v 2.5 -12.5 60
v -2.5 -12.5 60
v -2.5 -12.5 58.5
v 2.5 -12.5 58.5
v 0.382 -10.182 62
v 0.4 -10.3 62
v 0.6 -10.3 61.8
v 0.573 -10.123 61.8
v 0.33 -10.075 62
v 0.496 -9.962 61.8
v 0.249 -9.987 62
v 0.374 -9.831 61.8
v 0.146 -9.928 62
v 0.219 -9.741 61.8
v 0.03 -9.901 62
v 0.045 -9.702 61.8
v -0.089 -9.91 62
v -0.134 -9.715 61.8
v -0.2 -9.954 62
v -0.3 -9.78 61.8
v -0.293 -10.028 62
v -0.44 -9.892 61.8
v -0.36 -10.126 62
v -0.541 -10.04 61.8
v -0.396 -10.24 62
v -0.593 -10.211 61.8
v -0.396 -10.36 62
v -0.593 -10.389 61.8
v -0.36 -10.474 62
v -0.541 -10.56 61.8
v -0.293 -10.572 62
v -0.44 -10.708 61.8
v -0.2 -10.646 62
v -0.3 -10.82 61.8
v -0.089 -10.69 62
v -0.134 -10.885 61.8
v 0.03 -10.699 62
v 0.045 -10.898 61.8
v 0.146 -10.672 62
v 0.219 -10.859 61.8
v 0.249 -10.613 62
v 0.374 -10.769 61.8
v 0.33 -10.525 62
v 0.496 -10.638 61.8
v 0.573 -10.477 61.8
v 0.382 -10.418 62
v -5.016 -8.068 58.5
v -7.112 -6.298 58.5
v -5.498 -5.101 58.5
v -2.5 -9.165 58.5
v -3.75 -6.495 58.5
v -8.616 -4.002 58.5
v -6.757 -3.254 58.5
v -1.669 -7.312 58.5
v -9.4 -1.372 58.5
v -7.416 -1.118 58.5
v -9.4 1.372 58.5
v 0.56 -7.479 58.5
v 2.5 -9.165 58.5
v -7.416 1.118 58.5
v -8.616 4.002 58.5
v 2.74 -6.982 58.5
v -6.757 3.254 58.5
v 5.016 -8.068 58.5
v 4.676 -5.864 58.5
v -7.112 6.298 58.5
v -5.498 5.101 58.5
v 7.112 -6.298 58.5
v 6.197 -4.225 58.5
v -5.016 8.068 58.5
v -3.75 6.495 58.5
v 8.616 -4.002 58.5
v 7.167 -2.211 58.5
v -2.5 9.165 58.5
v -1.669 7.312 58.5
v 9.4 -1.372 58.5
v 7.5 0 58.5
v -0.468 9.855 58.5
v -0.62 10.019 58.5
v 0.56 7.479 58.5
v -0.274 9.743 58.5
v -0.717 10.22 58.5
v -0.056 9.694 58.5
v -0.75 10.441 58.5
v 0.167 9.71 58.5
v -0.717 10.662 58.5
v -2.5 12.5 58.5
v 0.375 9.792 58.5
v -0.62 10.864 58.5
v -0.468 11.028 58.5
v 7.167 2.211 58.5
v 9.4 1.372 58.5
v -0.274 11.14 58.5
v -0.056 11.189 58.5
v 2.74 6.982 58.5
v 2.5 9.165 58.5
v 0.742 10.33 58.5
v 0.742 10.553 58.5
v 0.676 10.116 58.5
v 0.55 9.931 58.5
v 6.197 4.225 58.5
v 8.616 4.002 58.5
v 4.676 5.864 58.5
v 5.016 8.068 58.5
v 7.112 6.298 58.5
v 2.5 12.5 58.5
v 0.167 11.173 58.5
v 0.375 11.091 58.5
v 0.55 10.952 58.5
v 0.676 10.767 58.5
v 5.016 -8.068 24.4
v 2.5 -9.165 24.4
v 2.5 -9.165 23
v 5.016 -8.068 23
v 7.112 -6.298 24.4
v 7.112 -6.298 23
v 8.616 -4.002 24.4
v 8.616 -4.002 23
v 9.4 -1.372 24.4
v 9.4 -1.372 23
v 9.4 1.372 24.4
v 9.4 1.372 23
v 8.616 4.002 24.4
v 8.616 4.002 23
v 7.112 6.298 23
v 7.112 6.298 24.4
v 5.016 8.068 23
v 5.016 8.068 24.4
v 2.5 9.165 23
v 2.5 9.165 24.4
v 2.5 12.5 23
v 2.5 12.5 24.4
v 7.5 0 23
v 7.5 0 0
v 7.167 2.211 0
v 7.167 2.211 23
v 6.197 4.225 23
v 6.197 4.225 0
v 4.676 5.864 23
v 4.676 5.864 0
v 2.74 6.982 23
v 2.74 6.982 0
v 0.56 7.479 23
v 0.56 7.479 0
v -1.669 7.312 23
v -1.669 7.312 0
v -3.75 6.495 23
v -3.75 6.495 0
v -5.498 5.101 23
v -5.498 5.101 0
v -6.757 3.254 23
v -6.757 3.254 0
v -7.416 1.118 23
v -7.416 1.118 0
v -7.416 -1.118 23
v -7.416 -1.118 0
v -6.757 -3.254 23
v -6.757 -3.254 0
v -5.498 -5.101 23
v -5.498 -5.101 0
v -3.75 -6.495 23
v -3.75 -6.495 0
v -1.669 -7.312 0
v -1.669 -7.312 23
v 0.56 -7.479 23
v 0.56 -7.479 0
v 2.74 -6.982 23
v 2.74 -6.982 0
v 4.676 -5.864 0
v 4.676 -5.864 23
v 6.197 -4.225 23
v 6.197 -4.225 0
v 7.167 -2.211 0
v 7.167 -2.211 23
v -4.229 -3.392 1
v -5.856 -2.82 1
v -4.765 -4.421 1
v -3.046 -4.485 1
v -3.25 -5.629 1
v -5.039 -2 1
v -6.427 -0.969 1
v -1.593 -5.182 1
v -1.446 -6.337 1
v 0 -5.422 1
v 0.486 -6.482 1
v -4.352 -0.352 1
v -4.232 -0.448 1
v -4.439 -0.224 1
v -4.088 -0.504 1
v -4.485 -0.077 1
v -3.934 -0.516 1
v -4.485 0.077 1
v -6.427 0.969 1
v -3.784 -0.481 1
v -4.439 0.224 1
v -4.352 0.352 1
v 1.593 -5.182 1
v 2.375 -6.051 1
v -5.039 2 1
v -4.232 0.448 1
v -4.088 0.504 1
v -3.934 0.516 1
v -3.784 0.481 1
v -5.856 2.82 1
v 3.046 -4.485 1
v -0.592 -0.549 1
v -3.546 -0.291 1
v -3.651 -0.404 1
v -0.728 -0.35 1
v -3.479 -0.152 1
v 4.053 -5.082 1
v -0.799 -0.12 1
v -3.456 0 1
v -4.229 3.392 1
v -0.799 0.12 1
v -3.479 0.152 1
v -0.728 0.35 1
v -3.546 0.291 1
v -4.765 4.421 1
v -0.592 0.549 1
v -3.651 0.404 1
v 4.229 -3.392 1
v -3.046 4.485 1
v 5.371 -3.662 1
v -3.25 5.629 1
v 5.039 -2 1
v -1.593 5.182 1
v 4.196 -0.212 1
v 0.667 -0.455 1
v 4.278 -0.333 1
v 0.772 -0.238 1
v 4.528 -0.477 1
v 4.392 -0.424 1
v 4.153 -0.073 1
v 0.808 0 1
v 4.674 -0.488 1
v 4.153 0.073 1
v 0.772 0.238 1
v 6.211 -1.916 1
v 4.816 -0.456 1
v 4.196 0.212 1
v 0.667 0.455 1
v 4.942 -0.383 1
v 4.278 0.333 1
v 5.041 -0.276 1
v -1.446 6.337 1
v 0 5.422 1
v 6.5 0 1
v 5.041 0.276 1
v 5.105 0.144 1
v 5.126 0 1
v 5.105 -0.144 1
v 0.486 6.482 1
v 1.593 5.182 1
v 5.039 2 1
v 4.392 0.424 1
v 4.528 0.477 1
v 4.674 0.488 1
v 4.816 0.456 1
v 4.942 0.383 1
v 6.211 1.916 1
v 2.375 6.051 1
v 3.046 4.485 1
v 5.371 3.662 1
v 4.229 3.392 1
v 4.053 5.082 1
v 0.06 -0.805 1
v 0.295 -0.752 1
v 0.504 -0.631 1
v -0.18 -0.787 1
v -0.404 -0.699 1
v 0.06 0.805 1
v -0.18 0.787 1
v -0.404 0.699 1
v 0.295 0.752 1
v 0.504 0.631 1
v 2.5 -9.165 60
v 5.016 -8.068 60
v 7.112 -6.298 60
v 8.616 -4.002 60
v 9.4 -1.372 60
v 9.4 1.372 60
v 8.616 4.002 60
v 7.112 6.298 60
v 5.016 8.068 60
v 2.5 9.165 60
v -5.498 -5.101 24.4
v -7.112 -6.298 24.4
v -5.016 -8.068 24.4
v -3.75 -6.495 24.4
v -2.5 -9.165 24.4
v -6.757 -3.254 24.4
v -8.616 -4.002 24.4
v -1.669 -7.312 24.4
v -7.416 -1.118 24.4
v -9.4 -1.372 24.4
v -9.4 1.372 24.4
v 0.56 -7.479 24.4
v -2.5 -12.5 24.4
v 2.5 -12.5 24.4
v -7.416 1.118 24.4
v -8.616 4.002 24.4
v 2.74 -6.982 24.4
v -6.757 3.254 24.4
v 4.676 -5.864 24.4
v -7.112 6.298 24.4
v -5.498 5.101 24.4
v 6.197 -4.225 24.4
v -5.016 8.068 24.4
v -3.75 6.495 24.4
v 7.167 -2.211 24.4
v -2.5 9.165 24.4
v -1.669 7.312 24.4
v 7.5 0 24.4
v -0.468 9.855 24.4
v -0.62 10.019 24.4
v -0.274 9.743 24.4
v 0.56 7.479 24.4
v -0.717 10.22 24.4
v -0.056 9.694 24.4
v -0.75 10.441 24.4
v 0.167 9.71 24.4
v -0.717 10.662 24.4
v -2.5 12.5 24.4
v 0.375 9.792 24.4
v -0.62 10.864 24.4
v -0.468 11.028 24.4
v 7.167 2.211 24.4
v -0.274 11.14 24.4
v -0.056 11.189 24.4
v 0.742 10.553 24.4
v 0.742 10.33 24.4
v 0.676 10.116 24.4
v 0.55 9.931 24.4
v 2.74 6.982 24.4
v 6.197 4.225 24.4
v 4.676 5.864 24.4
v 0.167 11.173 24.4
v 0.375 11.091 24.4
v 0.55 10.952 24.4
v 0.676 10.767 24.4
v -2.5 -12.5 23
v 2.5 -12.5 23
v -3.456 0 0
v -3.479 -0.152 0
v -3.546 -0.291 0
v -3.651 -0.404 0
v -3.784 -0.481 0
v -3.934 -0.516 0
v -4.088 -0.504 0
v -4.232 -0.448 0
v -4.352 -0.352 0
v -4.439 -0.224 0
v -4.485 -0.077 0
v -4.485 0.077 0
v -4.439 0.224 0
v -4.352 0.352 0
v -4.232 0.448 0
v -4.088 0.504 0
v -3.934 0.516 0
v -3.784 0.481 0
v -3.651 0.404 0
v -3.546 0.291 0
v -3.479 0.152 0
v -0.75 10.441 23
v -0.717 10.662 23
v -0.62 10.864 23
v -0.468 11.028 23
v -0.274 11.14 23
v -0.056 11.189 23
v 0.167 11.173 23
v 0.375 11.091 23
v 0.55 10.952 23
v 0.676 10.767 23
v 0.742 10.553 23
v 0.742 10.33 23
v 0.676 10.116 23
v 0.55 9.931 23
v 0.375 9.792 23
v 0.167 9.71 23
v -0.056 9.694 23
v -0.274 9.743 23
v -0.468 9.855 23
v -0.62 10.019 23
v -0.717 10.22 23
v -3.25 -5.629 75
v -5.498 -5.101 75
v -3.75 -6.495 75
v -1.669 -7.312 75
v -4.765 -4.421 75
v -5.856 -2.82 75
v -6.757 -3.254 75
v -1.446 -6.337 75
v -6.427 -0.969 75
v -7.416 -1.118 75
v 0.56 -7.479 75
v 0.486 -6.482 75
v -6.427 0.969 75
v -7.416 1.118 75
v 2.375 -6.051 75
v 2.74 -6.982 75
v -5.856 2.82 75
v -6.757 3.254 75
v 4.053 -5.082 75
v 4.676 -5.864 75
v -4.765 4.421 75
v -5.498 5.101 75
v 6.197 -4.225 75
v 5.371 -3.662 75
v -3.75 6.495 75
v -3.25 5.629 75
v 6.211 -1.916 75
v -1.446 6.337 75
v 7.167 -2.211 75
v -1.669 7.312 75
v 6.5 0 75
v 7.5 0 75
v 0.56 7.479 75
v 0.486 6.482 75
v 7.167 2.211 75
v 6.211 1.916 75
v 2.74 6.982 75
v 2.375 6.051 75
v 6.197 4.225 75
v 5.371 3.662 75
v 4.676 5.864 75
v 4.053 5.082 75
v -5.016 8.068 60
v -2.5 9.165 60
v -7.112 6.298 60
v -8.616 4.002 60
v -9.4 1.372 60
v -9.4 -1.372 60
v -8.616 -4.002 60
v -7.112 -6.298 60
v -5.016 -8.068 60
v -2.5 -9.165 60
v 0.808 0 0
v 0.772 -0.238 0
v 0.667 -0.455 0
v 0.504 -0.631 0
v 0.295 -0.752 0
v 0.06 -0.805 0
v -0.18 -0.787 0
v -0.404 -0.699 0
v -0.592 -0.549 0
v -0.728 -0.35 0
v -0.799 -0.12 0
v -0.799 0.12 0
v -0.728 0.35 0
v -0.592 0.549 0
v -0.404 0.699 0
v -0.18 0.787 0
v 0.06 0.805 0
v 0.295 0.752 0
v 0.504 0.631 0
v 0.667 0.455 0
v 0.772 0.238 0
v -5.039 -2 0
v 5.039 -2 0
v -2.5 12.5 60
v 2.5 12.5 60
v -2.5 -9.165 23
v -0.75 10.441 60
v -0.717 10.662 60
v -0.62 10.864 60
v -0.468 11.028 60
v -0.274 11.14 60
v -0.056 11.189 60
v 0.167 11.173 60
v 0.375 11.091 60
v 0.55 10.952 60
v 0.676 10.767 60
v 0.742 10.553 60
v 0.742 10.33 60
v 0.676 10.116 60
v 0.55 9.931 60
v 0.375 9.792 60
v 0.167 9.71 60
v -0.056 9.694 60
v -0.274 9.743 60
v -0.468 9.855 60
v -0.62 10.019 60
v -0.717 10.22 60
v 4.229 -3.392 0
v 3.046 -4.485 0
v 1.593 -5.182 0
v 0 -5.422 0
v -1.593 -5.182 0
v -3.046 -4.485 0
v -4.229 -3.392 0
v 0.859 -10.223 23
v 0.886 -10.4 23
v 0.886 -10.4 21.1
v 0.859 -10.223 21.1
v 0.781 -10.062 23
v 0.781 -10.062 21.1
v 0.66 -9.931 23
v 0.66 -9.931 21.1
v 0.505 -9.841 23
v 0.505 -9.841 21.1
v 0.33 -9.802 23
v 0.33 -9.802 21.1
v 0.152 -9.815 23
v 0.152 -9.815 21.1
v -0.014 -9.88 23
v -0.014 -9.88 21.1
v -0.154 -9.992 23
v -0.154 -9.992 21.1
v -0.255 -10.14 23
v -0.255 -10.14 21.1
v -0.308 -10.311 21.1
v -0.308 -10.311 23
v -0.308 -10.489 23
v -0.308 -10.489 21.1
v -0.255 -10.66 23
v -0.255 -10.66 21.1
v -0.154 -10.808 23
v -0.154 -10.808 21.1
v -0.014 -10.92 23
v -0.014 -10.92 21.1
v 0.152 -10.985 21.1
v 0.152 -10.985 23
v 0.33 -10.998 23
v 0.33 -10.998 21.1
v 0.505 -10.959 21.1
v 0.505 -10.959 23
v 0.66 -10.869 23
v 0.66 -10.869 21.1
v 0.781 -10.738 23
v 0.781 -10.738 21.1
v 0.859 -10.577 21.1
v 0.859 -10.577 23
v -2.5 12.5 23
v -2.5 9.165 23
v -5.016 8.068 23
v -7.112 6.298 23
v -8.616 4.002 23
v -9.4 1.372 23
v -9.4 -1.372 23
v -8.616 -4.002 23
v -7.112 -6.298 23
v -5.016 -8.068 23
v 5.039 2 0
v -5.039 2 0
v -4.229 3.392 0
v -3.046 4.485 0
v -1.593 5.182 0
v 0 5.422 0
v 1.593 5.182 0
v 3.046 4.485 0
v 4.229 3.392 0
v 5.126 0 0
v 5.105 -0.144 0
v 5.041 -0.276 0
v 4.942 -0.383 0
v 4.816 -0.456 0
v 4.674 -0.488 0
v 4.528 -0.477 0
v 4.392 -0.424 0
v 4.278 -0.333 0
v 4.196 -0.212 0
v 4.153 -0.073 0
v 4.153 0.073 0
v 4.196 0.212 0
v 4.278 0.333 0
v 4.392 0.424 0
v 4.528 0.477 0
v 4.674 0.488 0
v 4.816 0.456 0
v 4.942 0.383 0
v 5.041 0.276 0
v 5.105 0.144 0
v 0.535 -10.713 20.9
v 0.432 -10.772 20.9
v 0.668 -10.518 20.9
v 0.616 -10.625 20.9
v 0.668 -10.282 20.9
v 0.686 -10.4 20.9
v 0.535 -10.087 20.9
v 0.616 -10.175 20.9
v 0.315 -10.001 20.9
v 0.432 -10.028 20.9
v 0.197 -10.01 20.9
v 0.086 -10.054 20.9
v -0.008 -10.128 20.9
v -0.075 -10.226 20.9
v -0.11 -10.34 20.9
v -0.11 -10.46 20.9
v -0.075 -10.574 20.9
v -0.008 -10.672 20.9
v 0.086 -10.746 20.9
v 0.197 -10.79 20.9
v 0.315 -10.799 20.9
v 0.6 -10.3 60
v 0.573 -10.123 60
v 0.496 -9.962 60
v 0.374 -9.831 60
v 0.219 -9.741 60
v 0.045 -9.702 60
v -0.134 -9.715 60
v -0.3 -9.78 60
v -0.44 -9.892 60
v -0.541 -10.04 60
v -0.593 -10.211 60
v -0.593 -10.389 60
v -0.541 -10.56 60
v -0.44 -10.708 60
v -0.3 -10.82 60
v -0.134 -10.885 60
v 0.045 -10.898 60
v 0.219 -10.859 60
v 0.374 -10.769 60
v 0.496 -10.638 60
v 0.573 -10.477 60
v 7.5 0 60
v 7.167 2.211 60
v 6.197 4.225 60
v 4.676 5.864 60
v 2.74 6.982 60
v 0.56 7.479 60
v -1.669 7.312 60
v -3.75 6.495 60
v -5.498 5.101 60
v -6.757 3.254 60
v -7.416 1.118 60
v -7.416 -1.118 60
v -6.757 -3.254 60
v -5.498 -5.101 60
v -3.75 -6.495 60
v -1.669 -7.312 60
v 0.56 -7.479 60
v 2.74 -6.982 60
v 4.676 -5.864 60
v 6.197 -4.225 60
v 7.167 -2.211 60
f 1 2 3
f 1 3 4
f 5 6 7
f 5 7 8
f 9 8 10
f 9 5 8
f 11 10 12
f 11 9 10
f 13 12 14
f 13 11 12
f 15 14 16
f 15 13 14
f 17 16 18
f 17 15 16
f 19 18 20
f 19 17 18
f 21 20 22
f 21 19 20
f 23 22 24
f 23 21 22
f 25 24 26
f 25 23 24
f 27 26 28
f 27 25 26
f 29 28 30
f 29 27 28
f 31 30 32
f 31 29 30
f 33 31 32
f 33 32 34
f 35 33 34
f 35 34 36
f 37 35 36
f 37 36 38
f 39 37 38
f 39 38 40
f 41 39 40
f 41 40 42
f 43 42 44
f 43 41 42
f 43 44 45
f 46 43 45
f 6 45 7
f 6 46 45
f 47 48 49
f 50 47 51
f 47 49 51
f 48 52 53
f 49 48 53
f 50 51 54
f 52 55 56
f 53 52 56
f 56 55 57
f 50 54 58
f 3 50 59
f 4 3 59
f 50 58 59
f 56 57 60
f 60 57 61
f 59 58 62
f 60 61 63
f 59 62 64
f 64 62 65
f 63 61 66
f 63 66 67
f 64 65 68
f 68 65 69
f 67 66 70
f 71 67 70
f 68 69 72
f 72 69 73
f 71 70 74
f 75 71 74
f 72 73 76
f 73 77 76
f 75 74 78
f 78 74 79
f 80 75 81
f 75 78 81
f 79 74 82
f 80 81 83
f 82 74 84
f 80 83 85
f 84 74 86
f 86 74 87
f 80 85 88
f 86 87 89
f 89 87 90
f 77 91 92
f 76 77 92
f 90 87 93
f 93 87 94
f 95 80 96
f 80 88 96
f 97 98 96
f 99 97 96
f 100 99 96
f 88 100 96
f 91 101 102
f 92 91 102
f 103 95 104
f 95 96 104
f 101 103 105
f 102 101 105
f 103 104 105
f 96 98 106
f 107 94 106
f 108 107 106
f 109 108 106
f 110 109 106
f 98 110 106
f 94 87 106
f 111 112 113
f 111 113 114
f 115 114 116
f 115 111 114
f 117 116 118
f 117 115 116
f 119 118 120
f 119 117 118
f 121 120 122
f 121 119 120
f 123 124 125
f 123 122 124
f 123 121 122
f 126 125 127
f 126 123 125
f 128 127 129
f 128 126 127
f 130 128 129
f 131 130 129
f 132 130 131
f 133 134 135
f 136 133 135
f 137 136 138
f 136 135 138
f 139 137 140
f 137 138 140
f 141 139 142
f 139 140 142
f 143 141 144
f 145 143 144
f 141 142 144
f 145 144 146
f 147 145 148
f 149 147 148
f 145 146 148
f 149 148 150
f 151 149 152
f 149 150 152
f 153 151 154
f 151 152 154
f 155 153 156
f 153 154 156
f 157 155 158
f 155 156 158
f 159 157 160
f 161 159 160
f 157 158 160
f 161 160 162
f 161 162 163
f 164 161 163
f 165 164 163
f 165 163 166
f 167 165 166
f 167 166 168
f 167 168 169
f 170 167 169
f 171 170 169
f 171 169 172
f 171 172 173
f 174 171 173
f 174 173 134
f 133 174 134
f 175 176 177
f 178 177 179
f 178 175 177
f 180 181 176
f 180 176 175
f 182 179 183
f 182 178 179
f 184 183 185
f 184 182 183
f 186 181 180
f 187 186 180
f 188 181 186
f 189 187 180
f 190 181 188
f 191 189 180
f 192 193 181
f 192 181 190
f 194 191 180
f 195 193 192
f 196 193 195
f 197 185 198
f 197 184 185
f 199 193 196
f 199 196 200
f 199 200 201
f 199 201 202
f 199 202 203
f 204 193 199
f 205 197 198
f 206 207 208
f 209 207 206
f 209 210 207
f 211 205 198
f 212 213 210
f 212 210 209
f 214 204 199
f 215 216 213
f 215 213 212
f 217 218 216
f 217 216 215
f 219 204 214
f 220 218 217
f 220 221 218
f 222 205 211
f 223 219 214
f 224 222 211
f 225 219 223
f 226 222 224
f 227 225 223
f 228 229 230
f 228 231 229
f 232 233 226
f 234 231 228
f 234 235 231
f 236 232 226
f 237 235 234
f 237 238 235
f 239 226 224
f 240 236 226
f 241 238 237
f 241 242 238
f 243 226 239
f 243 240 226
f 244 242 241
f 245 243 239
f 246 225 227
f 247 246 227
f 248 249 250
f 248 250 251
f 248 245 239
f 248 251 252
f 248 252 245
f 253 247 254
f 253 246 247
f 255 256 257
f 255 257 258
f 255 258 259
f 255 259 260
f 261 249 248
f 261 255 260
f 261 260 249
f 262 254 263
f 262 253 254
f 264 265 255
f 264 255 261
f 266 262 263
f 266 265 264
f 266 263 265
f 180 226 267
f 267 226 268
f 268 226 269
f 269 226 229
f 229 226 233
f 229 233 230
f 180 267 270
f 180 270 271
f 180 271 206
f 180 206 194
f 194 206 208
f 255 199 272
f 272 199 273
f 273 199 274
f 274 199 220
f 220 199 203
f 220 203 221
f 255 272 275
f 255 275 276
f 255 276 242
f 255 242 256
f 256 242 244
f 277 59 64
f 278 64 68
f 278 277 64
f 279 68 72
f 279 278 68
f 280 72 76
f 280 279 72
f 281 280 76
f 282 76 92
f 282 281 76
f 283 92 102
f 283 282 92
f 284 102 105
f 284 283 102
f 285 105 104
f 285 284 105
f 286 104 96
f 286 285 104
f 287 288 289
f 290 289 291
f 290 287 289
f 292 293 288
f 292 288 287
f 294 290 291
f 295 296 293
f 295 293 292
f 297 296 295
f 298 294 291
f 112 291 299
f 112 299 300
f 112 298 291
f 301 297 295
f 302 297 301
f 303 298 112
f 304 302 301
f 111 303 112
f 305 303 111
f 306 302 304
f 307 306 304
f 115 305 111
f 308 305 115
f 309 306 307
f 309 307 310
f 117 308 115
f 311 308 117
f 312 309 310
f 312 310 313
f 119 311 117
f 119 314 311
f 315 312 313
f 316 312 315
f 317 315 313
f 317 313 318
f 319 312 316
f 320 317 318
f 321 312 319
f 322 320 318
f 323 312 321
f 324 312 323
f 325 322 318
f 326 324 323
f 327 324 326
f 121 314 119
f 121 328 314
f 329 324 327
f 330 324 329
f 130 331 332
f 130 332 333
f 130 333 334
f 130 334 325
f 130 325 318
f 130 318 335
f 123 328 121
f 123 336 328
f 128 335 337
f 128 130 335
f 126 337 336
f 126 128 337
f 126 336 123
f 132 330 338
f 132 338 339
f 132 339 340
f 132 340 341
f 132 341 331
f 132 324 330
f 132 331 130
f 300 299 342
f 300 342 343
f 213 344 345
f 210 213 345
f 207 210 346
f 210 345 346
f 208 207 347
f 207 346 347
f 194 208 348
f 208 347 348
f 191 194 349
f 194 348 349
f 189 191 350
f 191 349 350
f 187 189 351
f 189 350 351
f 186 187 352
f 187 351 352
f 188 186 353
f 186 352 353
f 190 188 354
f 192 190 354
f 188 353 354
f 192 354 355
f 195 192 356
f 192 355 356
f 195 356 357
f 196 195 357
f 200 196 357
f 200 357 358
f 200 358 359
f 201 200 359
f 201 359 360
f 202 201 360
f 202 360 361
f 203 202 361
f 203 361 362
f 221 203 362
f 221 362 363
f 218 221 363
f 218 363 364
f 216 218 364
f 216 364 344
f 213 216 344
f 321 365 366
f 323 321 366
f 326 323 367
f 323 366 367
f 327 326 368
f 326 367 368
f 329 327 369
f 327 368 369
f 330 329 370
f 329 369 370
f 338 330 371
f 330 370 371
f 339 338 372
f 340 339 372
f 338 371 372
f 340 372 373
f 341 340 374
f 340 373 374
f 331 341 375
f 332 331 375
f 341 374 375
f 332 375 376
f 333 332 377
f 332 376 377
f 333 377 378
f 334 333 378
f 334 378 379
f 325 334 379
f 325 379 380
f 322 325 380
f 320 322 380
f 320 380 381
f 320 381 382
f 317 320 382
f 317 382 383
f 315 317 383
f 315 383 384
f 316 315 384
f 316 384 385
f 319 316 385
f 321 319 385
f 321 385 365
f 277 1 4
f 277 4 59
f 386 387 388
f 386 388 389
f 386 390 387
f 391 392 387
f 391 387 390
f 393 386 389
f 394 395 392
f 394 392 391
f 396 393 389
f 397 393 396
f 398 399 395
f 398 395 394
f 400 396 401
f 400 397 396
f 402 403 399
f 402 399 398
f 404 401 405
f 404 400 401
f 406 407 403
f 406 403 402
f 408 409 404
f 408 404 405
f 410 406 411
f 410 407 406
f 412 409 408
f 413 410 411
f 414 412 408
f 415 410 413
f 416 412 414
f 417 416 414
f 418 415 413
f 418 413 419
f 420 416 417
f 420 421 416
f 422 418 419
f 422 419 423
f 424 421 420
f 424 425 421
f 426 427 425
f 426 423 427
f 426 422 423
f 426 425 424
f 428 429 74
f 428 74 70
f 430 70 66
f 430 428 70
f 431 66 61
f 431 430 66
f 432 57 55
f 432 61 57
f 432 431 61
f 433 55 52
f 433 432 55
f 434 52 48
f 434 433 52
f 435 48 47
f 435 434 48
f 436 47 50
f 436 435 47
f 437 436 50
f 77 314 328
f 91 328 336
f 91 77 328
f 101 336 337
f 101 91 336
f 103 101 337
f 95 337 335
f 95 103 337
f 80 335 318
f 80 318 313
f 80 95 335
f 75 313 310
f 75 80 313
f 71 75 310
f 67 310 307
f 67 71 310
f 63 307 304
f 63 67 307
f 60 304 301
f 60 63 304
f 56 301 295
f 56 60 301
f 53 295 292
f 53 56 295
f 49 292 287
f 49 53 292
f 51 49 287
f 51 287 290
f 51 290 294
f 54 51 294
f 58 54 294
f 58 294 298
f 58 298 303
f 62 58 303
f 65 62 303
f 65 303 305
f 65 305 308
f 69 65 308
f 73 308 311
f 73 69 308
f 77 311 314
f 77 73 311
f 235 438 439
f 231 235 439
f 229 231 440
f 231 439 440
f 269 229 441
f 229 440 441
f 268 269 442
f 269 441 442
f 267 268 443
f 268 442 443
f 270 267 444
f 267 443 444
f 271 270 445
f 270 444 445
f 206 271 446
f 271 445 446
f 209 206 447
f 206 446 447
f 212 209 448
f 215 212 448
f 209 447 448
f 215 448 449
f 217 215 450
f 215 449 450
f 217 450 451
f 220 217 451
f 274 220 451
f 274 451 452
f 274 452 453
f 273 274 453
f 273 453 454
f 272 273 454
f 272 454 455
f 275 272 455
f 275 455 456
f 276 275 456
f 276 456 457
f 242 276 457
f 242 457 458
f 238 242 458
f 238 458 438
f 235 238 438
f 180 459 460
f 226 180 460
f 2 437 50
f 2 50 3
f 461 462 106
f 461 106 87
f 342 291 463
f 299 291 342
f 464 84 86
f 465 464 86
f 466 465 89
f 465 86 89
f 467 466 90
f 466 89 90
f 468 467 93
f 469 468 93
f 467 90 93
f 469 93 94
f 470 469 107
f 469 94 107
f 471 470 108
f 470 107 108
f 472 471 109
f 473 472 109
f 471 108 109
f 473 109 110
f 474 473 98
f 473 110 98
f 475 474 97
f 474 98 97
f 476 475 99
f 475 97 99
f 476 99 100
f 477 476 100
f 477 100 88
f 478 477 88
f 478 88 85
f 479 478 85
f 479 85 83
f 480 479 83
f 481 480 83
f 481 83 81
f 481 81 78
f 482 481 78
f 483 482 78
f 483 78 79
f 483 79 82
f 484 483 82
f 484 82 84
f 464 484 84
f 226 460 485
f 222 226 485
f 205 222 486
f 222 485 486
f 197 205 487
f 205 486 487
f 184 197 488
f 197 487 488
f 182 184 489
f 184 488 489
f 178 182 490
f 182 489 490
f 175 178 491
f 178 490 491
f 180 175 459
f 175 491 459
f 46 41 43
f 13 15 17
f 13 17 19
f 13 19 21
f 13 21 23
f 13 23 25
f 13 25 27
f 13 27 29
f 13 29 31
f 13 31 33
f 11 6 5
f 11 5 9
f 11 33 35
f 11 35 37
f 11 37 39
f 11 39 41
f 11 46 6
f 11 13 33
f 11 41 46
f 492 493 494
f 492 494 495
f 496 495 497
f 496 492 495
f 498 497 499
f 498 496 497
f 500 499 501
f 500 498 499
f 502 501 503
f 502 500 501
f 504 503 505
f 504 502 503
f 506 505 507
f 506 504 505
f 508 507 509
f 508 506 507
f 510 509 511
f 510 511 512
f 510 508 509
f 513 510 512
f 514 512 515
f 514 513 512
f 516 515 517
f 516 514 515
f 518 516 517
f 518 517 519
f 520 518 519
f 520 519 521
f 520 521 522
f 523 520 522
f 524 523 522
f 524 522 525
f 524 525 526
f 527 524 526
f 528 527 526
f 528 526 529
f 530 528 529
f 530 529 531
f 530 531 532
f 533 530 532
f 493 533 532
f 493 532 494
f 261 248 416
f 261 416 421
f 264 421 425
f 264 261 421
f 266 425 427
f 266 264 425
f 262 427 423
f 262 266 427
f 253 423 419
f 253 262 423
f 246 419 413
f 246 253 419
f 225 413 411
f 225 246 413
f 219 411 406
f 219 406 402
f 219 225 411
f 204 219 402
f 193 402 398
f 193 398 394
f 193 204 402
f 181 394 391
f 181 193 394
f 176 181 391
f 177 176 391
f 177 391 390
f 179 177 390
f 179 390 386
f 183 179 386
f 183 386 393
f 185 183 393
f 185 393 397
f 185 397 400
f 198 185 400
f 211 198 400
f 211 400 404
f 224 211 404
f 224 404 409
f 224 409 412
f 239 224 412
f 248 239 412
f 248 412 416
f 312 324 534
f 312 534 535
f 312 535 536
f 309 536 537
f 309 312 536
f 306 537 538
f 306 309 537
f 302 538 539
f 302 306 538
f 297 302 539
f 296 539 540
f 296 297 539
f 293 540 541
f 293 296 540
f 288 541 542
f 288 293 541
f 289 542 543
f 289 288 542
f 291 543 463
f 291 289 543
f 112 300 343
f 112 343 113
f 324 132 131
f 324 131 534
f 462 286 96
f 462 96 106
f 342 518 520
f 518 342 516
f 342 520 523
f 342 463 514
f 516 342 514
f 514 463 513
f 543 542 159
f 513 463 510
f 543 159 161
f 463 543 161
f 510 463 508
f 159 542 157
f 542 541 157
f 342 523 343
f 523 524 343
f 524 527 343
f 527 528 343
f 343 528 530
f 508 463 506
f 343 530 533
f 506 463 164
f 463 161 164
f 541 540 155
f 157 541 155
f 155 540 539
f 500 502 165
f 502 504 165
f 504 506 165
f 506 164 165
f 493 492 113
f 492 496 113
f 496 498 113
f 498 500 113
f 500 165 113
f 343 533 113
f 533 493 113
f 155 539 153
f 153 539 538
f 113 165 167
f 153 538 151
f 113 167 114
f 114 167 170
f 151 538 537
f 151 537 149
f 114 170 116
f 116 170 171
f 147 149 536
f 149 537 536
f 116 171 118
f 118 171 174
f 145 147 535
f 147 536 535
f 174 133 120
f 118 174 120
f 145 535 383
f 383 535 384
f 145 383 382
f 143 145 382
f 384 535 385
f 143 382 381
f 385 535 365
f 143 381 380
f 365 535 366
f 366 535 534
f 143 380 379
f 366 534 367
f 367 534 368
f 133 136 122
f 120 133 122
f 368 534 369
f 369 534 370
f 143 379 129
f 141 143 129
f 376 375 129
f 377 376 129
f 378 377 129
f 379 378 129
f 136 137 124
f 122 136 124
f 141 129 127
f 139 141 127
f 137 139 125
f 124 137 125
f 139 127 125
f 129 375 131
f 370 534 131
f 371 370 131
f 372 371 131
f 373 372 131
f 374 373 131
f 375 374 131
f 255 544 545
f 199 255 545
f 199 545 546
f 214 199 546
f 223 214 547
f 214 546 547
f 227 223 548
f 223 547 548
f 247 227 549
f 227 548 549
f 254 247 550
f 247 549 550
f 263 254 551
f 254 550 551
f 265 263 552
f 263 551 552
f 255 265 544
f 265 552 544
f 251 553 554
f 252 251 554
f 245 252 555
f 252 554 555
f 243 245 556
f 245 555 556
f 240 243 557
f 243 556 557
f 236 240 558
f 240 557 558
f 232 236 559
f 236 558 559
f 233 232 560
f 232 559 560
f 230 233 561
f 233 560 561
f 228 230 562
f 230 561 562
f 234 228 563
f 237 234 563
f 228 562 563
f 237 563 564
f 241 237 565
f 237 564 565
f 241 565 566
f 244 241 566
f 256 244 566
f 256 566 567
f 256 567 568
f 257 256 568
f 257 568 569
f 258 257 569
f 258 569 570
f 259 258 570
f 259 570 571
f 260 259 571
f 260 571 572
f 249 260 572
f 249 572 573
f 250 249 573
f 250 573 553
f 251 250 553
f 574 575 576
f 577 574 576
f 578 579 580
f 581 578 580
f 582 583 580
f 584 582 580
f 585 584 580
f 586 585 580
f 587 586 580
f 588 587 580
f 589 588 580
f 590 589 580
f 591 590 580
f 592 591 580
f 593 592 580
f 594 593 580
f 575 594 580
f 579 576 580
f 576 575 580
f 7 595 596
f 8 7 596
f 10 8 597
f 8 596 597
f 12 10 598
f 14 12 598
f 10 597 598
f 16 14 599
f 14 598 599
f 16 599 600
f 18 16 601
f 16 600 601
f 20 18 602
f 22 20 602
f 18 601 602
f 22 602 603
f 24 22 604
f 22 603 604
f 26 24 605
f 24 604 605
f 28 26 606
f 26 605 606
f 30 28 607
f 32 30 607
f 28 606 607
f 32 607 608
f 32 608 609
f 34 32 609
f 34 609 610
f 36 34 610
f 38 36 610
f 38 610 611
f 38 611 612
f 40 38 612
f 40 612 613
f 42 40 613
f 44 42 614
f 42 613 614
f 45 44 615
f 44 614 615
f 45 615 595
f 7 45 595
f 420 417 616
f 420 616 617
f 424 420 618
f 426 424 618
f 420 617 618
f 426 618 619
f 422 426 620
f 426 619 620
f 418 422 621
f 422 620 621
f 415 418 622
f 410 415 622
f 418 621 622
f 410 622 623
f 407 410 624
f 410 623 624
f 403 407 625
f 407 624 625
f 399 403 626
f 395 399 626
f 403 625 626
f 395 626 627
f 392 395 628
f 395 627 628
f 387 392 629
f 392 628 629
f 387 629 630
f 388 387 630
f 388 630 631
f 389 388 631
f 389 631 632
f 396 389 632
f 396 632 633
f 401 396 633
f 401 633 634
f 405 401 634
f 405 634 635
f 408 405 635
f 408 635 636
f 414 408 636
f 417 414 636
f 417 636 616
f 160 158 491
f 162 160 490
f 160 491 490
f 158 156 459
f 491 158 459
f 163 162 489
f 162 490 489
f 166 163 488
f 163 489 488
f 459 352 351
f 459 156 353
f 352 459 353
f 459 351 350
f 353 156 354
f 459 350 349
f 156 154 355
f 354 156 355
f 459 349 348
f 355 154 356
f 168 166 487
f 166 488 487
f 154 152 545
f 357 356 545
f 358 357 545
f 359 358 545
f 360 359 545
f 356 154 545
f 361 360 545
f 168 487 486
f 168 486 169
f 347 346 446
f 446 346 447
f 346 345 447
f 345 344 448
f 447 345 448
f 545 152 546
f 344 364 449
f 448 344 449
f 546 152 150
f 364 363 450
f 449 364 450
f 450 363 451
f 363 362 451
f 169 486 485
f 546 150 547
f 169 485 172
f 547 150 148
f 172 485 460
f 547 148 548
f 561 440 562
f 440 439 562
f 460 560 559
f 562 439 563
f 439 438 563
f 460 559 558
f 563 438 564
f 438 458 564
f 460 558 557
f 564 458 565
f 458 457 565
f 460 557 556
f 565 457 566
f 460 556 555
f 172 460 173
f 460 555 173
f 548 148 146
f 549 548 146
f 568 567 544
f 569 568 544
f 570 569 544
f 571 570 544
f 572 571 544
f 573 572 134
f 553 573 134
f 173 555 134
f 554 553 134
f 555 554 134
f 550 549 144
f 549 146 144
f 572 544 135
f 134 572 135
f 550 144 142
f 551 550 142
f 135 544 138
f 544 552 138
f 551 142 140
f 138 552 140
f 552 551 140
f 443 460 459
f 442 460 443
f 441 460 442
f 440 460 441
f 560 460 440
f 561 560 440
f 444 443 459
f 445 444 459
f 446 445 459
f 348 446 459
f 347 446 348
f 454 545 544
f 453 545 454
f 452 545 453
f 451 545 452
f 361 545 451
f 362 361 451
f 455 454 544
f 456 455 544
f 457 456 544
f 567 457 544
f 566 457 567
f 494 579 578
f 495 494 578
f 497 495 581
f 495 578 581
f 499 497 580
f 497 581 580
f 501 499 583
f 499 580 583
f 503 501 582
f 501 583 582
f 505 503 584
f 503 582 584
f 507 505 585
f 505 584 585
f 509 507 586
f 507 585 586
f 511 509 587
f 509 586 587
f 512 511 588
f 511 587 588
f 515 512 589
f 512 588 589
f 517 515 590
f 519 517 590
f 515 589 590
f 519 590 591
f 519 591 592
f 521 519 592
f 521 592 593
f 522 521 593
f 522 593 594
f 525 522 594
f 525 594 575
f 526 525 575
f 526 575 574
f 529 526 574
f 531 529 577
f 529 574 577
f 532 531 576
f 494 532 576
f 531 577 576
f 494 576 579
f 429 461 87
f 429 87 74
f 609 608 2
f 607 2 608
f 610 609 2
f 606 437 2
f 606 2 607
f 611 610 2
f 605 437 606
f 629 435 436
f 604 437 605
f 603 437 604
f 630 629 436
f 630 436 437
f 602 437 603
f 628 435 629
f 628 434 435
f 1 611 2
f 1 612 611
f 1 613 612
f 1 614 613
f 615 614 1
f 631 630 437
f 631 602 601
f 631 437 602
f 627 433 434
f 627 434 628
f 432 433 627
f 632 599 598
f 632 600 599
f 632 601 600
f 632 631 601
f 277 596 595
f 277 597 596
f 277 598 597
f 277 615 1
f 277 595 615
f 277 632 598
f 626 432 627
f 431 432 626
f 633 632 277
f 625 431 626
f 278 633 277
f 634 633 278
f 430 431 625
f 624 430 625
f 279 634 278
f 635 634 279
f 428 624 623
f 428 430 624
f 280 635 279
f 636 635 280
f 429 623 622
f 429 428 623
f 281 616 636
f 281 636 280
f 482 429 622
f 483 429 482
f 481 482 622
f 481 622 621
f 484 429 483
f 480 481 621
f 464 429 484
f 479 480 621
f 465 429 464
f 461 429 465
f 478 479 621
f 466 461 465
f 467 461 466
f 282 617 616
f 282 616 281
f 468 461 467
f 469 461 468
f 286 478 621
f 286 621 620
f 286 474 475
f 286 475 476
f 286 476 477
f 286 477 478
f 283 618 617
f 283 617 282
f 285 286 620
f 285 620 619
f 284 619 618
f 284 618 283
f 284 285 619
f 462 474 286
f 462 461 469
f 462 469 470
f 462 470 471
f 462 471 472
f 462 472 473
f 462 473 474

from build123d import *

# Parameters (mm, degrees)
F0_R        = 7.5
F1_DEPTH    = 75
F2_T        = -1
F4_DEPTH    = 25
F6_D        = 1.5
F6_DEPTH    = 25
F6_TIP      = 0.4506454643
F5_R        = 0.8075633059
F5_R_2      = 0.5172212245
F5_R_3      = 0.4893329223
F7_DEPTH    = 25
F9_START    = -15
F8_R        = 9.5
F8_R_2      = 7.5
F9_DEPTH    = 37
F10_START   = -1.5
F9_FACE_R   = 9.5
F9_FACE_R_2 = 7.5
F10_DEPTH   = 34.1
F12_DEPTH   = 37
F13_W       = 3.3348486101
F13_H       = 34.1
F13_W_2     = 5
F14_DEPTH   = 25
F16_D       = 1.5
F16_DEPTH   = 200
F16_TIP     = 0.4506454643
F17_R       = 0.6
F18_DEPTH   = 2
F19_SIZE    = 0.2
F20_R       = 0.6
F21_DEPTH   = 3.5
F22_SIZE    = 0.2


with BuildPart() as f1:
    # F0 (on Top) → F1 (new body)
    with BuildSketch(Plane.XY):
        Circle(F0_R)
    extrude(amount=F1_DEPTH)

    # F2
    f2_openings = [f1.faces().sort_by_distance(p)[0] for p in [
        (0, 0, 75),
    ]]
    offset(amount=F2_T, openings=f2_openings)

    # F3 (on face) → F4 (cut)
    with BuildSketch(Plane(origin=(0, 0, 0), x_dir=(1, 0, 0), z_dir=(0, 0, -1))):
        with BuildLine():
            Line((-5.0392321942, 2), (5.0392321942, 2))
            ThreePointArc((5.0392321942, 2), (0, 5.421610564), (-5.0392321942, 2))
        make_face()
        with BuildLine():
            ThreePointArc((-5.0392321942, -2), (0, -5.421610564), (5.0392321942, -2))
            Line((5.0392321942, -2), (-5.0392321942, -2))
        make_face()
    extrude(amount=-F4_DEPTH, mode=Mode.SUBTRACT)

    # F6
    with Locations(Plane(origin=(0, 0, 0), x_dir=(1, 0, 0), z_dir=(0, 0, -1))):
        with Locations((0, 0)):
            Hole(F6_D / 2, depth=F6_DEPTH)
            with Locations((0, 0, -(F6_DEPTH + F6_TIP / 2))):  # 118° drill point
                Cone(0, F6_D / 2, F6_TIP, mode=Mode.SUBTRACT)

    # F5 (on face) → F7 (cut)
    with BuildSketch(Plane(origin=(0, 0, 0), x_dir=(1, 0, 0), z_dir=(0, 0, -1))):
        Circle(F5_R)
        with Locations((-3.9731087163, 0)):
            Circle(F5_R_2)
        with Locations((4.63699596, 0)):
            Circle(F5_R_3)
    extrude(amount=-F7_DEPTH, mode=Mode.SUBTRACT)

    # F8 (on face) → F9 (join)
    with BuildSketch(Plane.XY.offset(75).offset(F9_START)):
        Circle(F8_R)
        Circle(F8_R_2, mode=Mode.SUBTRACT)
    extrude(amount=-F9_DEPTH)

    # F9_face (on face) → F10 (cut)
    with BuildSketch(Plane.XY.offset(60).offset(F10_START)):
        Circle(F9_FACE_R)
        Circle(F9_FACE_R_2, mode=Mode.SUBTRACT)
    extrude(amount=-F10_DEPTH, mode=Mode.SUBTRACT)

    # F11 (on face) → F12 (join)
    with BuildSketch(Plane.XY.offset(60)):
        with BuildLine():
            ThreePointArc((2.5, -9.1651513899), (0, -9.5), (-2.5, -9.1651513899))
            Line((-2.5, -9.1651513899), (-2.5, -12.5))
            Line((-2.5, -12.5), (2.5, -12.5))
            Line((2.5, -12.5), (2.5, -9.1651513899))
        make_face()
        with BuildLine():
            Line((-2.5, 12.5), (-2.5, 9.1651513899))
            ThreePointArc((-2.5, 9.1651513899), (0, 9.5), (2.5, 9.1651513899))
            Line((2.5, 9.1651513899), (2.5, 12.5))
            Line((2.5, 12.5), (-2.5, 12.5))
        make_face()
    extrude(amount=-F12_DEPTH)

    # F13 (on face) → F14 (cut)
    with BuildSketch(Plane.YZ.offset(2.5)):
        with Locations((10.832575695, 41.45)):
            Rectangle(F13_W, F13_H)
        with Locations((-11.1832837015, 41.45)):
            Rectangle(F13_W_2, F13_H)
    extrude(amount=-F14_DEPTH, mode=Mode.SUBTRACT)

    # F16
    with Locations(Plane.XY.offset(60)):
        with Locations((0, 10.4414262056)):
            Hole(F16_D / 2, depth=F16_DEPTH)
            with Locations((0, 0, -(F16_DEPTH + F16_TIP / 2))):  # 118° drill point
                Cone(0, F16_D / 2, F16_TIP, mode=Mode.SUBTRACT)

    # F17 (on face) → F18 (join)
    with BuildSketch(Plane.XY.offset(60)):
        with Locations((0, -10.3)):
            Circle(F17_R)
    extrude(amount=F18_DEPTH)

    # F19
    f19_edges = [f1.edges().sort_by_distance(p)[0] for p in [
        (-0.6, -10.3, 62),
    ]]
    chamfer(f19_edges, length=F19_SIZE)

    # F20 (on face) → F21 (join)
    with BuildSketch(Plane.XY.offset(24.4)):
        with Locations((0.2855480707, -10.4)):
            Circle(F20_R)
    extrude(amount=-F21_DEPTH)

    # F22
    f22_edges = [f1.edges().sort_by_distance(p)[0] for p in [
        (-0.314452, -10.4, 20.9),
    ]]
    chamfer(f22_edges, length=F22_SIZE)


solid = f1.part
